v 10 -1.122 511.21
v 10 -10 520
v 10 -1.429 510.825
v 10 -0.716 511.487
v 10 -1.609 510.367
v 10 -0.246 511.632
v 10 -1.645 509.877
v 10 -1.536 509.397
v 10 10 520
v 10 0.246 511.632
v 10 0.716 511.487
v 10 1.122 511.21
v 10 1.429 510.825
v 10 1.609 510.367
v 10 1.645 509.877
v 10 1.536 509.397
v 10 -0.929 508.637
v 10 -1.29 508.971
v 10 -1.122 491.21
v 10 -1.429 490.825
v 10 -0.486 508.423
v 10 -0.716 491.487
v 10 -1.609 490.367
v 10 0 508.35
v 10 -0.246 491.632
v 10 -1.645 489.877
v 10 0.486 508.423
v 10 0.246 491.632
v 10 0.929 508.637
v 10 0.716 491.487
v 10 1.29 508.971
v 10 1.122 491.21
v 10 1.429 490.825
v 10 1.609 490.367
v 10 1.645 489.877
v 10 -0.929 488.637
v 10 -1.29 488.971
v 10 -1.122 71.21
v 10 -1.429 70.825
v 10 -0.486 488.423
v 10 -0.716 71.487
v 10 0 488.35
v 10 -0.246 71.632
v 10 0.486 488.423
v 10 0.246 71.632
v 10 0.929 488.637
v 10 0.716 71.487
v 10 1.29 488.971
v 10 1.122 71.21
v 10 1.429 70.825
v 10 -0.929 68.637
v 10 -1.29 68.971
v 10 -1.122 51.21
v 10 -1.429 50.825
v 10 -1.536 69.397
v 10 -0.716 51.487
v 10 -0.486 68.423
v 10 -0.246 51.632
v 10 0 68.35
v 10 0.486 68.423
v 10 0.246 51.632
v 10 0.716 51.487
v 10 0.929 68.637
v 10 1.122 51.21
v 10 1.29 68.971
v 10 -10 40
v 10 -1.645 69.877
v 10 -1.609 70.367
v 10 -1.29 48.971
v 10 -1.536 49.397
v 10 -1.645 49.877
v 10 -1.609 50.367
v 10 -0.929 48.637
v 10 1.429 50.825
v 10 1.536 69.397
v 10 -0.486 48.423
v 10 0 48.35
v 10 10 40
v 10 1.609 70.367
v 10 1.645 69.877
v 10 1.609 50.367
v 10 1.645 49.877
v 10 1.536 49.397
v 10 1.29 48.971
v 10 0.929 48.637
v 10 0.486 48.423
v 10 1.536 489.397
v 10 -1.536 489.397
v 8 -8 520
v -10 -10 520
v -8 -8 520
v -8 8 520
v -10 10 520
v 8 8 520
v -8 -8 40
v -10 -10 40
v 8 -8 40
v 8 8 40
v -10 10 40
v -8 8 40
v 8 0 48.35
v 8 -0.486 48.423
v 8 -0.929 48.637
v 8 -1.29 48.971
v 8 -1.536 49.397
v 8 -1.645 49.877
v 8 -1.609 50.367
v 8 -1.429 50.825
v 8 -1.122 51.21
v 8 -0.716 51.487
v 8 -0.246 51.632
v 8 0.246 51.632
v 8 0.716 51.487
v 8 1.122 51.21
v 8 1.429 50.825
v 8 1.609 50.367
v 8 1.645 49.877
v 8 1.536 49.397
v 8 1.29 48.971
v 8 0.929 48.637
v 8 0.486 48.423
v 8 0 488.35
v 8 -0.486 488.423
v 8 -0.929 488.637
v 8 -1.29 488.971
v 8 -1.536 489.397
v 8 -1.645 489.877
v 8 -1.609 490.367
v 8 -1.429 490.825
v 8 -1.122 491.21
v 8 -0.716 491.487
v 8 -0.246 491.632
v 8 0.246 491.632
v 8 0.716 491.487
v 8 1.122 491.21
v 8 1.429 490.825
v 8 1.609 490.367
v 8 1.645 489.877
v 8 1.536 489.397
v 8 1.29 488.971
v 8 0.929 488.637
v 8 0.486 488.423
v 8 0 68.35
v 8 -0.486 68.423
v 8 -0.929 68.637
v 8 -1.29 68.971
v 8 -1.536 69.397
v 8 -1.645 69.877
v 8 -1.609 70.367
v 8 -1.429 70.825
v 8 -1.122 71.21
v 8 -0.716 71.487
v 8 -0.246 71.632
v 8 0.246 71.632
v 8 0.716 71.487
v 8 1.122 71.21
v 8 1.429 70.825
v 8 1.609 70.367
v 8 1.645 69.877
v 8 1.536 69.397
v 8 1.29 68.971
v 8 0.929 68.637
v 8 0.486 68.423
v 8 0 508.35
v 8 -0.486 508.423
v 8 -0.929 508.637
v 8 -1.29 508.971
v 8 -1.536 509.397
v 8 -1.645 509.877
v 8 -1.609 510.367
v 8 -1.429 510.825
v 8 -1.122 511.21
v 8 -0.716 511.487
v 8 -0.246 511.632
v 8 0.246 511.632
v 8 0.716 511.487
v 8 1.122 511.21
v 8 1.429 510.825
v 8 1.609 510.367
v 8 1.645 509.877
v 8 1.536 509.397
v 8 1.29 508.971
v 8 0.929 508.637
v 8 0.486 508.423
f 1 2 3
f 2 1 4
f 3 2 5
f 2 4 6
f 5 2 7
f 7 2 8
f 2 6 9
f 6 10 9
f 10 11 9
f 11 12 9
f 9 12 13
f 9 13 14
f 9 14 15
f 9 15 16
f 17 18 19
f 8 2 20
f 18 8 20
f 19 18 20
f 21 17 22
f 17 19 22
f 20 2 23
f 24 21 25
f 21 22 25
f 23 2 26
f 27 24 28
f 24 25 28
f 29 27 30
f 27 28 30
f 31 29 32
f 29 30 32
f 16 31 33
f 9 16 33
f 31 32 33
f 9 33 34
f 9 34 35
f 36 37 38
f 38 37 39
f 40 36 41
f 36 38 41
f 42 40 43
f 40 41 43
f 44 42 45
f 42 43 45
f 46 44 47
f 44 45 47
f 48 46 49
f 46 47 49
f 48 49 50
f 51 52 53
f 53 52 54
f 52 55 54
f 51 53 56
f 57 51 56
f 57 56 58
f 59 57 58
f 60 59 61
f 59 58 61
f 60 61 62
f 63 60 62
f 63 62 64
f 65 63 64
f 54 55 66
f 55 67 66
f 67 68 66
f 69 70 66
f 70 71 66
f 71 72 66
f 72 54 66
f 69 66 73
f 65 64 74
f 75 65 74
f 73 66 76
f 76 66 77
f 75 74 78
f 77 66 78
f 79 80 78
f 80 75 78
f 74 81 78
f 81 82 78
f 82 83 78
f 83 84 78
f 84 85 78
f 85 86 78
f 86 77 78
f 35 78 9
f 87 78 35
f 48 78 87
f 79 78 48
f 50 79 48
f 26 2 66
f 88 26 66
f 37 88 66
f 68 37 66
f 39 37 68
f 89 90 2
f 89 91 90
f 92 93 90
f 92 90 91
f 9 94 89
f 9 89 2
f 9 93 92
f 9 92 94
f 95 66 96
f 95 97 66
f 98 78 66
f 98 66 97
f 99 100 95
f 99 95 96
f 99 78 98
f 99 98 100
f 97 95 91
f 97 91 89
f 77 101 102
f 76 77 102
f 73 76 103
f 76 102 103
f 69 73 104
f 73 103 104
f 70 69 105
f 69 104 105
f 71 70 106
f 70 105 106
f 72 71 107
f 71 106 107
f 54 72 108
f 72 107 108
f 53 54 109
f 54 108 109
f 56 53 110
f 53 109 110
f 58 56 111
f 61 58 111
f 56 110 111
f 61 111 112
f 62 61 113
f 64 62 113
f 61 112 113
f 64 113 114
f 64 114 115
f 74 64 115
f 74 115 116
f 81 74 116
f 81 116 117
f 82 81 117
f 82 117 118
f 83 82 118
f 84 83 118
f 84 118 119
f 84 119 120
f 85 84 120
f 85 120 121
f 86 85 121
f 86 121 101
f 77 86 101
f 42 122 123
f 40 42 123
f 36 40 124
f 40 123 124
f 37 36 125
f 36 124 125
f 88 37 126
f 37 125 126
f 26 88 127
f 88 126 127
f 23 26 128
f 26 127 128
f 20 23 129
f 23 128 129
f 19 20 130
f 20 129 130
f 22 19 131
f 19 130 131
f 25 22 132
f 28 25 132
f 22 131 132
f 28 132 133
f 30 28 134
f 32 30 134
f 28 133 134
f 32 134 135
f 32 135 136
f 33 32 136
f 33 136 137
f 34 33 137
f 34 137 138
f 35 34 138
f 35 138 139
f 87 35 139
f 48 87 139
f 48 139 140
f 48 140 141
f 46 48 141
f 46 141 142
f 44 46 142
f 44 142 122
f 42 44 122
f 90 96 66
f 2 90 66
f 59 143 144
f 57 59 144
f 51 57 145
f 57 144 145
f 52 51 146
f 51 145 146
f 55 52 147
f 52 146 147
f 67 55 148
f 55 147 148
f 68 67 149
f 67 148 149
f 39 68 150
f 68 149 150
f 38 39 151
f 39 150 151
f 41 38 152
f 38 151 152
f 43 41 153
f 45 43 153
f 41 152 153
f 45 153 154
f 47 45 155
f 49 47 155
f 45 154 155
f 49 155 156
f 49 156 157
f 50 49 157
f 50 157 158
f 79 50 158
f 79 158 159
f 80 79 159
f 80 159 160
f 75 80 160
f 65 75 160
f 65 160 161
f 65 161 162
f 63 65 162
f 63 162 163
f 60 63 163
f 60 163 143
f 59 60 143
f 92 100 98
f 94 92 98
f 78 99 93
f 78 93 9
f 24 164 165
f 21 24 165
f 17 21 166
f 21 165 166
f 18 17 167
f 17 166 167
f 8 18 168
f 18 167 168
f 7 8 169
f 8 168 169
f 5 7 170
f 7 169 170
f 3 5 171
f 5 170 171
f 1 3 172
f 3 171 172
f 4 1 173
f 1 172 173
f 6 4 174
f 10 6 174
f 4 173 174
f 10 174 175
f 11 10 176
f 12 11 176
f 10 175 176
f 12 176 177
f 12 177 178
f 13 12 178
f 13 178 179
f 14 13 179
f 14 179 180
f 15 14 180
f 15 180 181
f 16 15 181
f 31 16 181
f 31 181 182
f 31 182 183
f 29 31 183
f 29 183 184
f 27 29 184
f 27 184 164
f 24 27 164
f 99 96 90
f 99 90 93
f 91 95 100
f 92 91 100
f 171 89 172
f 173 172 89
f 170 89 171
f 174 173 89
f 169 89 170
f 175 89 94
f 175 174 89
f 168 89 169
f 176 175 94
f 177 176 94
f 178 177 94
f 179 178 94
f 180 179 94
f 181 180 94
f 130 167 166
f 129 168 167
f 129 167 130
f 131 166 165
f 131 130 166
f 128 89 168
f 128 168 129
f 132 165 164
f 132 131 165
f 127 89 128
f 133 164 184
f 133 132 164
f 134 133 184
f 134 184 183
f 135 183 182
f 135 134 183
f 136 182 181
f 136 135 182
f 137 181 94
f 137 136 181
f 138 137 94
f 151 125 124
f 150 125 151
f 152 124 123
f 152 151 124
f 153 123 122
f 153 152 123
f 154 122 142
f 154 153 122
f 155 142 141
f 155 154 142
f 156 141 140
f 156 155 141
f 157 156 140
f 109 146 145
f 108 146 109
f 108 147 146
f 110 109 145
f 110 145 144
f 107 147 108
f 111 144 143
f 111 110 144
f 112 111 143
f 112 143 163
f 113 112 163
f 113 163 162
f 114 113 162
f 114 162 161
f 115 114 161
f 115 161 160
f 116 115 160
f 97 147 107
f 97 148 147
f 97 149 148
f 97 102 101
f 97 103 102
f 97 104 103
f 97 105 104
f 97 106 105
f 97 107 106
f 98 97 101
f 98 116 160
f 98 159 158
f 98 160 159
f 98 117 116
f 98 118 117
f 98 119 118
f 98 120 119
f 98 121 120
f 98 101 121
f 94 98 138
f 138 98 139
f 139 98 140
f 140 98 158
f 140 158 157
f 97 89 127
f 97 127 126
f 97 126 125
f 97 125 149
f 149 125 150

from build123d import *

# Parameters (mm, degrees)
SKETCH_1_W          = 20
SKETCH_1_H          = 20
SKETCH_1_W_2        = 16
SKETCH_1_H_2        = 16
EXTRUDE_1_DEPTH     = 560
SKETCH_3_R          = 2.2
CUT_EXTRUDE_2_DEPTH = 560
SKETCH_4_R          = 2.2
CUT_EXTRUDE_3_DEPTH = 560
SKETCH_5_W          = 35.553041162
SKETCH_5_H          = 54.410354854
CUT_EXTRUDE_4_DEPTH = 40
SKETCH_6_W          = 32.938502486
SKETCH_6_H          = 36.721798984
CUT_EXTRUDE_5_DEPTH = 40
SKETCH_8_R          = 1
CUT_EXTRUDE_7_DEPTH = 10
M4X0_7_1_D          = 3.3
M4X0_7_1_DEPTH      = 11.5
M4X0_7_1_TIP        = 0.991420021


with BuildPart() as part:
    # ｽｹｯﾁ1 → ﾎﾞｽ - 押し出し1 (new body)
    with BuildSketch(Plane.XY):
        Rectangle(SKETCH_1_W, SKETCH_1_H)
        Rectangle(SKETCH_1_W_2, SKETCH_1_H_2, mode=Mode.SUBTRACT)
    extrude(amount=EXTRUDE_1_DEPTH)

    # ｽｹｯﾁ3 → ｶｯﾄ - 押し出し2 (cut)
    with BuildSketch(Plane(origin=(10, 0, 0), x_dir=(0, 0, -1), z_dir=(1, 0, 0))):
        with Locations((-530, 0)):
            Circle(SKETCH_3_R)
        with Locations((-30, 0)):
            Circle(SKETCH_3_R)
    extrude(amount=-CUT_EXTRUDE_2_DEPTH, mode=Mode.SUBTRACT)

    # ｽｹｯﾁ4 → ｶｯﾄ - 押し出し3 (cut)
    with BuildSketch(Plane(origin=(0, 10, 0), x_dir=(1, 0, 0), z_dir=(0, 1, 0))):
        with Locations((0, -550)):
            Circle(SKETCH_4_R)
        with Locations((0, -10)):
            Circle(SKETCH_4_R)
    extrude(amount=-CUT_EXTRUDE_3_DEPTH, mode=Mode.SUBTRACT)

    # ｽｹｯﾁ5 → ｶｯﾄ - 押し出し4 (cut)
    with BuildSketch(Plane(origin=(0, 0, 0), x_dir=(-1, 0, 0), z_dir=(0, 0, -1))):
        Rectangle(SKETCH_5_W, SKETCH_5_H)
    extrude(amount=-CUT_EXTRUDE_4_DEPTH, mode=Mode.SUBTRACT)

    # ｽｹｯﾁ6 → ｶｯﾄ - 押し出し5 (cut)
    with BuildSketch(Plane.XY.offset(560)):
        Rectangle(SKETCH_6_W, SKETCH_6_H)
    extrude(amount=-CUT_EXTRUDE_5_DEPTH, mode=Mode.SUBTRACT)

    # ｽｹｯﾁ8 → ｶｯﾄ - 押し出し7 (cut)
    with BuildSketch(Plane(origin=(10, 0, 0), x_dir=(0, 0, -1), z_dir=(1, 0, 0))):
        with Locations((-50, 0)):
            Circle(SKETCH_8_R)
        with Locations((-70, 0)):
            Circle(SKETCH_8_R)
        with Locations((-490, 0)):
            Circle(SKETCH_8_R)
        with Locations((-510, 0)):
            Circle(SKETCH_8_R)
    extrude(amount=-CUT_EXTRUDE_7_DEPTH, mode=Mode.SUBTRACT)

    # M4x0.7 ねじ穴1
    with Locations(Plane(origin=(10, 0, 50), x_dir=(0, 0, 1), z_dir=(1, 0, 0))):
        with Locations((0, 0), (20, 0), (440, 0), (460, 0)):
            Hole(M4X0_7_1_D / 2, depth=M4X0_7_1_DEPTH)
            with Locations((0, 0, -(M4X0_7_1_DEPTH + M4X0_7_1_TIP / 2))):  # 118° drill point
                Cone(0, M4X0_7_1_D / 2, M4X0_7_1_TIP, mode=Mode.SUBTRACT)


solid = part.part
